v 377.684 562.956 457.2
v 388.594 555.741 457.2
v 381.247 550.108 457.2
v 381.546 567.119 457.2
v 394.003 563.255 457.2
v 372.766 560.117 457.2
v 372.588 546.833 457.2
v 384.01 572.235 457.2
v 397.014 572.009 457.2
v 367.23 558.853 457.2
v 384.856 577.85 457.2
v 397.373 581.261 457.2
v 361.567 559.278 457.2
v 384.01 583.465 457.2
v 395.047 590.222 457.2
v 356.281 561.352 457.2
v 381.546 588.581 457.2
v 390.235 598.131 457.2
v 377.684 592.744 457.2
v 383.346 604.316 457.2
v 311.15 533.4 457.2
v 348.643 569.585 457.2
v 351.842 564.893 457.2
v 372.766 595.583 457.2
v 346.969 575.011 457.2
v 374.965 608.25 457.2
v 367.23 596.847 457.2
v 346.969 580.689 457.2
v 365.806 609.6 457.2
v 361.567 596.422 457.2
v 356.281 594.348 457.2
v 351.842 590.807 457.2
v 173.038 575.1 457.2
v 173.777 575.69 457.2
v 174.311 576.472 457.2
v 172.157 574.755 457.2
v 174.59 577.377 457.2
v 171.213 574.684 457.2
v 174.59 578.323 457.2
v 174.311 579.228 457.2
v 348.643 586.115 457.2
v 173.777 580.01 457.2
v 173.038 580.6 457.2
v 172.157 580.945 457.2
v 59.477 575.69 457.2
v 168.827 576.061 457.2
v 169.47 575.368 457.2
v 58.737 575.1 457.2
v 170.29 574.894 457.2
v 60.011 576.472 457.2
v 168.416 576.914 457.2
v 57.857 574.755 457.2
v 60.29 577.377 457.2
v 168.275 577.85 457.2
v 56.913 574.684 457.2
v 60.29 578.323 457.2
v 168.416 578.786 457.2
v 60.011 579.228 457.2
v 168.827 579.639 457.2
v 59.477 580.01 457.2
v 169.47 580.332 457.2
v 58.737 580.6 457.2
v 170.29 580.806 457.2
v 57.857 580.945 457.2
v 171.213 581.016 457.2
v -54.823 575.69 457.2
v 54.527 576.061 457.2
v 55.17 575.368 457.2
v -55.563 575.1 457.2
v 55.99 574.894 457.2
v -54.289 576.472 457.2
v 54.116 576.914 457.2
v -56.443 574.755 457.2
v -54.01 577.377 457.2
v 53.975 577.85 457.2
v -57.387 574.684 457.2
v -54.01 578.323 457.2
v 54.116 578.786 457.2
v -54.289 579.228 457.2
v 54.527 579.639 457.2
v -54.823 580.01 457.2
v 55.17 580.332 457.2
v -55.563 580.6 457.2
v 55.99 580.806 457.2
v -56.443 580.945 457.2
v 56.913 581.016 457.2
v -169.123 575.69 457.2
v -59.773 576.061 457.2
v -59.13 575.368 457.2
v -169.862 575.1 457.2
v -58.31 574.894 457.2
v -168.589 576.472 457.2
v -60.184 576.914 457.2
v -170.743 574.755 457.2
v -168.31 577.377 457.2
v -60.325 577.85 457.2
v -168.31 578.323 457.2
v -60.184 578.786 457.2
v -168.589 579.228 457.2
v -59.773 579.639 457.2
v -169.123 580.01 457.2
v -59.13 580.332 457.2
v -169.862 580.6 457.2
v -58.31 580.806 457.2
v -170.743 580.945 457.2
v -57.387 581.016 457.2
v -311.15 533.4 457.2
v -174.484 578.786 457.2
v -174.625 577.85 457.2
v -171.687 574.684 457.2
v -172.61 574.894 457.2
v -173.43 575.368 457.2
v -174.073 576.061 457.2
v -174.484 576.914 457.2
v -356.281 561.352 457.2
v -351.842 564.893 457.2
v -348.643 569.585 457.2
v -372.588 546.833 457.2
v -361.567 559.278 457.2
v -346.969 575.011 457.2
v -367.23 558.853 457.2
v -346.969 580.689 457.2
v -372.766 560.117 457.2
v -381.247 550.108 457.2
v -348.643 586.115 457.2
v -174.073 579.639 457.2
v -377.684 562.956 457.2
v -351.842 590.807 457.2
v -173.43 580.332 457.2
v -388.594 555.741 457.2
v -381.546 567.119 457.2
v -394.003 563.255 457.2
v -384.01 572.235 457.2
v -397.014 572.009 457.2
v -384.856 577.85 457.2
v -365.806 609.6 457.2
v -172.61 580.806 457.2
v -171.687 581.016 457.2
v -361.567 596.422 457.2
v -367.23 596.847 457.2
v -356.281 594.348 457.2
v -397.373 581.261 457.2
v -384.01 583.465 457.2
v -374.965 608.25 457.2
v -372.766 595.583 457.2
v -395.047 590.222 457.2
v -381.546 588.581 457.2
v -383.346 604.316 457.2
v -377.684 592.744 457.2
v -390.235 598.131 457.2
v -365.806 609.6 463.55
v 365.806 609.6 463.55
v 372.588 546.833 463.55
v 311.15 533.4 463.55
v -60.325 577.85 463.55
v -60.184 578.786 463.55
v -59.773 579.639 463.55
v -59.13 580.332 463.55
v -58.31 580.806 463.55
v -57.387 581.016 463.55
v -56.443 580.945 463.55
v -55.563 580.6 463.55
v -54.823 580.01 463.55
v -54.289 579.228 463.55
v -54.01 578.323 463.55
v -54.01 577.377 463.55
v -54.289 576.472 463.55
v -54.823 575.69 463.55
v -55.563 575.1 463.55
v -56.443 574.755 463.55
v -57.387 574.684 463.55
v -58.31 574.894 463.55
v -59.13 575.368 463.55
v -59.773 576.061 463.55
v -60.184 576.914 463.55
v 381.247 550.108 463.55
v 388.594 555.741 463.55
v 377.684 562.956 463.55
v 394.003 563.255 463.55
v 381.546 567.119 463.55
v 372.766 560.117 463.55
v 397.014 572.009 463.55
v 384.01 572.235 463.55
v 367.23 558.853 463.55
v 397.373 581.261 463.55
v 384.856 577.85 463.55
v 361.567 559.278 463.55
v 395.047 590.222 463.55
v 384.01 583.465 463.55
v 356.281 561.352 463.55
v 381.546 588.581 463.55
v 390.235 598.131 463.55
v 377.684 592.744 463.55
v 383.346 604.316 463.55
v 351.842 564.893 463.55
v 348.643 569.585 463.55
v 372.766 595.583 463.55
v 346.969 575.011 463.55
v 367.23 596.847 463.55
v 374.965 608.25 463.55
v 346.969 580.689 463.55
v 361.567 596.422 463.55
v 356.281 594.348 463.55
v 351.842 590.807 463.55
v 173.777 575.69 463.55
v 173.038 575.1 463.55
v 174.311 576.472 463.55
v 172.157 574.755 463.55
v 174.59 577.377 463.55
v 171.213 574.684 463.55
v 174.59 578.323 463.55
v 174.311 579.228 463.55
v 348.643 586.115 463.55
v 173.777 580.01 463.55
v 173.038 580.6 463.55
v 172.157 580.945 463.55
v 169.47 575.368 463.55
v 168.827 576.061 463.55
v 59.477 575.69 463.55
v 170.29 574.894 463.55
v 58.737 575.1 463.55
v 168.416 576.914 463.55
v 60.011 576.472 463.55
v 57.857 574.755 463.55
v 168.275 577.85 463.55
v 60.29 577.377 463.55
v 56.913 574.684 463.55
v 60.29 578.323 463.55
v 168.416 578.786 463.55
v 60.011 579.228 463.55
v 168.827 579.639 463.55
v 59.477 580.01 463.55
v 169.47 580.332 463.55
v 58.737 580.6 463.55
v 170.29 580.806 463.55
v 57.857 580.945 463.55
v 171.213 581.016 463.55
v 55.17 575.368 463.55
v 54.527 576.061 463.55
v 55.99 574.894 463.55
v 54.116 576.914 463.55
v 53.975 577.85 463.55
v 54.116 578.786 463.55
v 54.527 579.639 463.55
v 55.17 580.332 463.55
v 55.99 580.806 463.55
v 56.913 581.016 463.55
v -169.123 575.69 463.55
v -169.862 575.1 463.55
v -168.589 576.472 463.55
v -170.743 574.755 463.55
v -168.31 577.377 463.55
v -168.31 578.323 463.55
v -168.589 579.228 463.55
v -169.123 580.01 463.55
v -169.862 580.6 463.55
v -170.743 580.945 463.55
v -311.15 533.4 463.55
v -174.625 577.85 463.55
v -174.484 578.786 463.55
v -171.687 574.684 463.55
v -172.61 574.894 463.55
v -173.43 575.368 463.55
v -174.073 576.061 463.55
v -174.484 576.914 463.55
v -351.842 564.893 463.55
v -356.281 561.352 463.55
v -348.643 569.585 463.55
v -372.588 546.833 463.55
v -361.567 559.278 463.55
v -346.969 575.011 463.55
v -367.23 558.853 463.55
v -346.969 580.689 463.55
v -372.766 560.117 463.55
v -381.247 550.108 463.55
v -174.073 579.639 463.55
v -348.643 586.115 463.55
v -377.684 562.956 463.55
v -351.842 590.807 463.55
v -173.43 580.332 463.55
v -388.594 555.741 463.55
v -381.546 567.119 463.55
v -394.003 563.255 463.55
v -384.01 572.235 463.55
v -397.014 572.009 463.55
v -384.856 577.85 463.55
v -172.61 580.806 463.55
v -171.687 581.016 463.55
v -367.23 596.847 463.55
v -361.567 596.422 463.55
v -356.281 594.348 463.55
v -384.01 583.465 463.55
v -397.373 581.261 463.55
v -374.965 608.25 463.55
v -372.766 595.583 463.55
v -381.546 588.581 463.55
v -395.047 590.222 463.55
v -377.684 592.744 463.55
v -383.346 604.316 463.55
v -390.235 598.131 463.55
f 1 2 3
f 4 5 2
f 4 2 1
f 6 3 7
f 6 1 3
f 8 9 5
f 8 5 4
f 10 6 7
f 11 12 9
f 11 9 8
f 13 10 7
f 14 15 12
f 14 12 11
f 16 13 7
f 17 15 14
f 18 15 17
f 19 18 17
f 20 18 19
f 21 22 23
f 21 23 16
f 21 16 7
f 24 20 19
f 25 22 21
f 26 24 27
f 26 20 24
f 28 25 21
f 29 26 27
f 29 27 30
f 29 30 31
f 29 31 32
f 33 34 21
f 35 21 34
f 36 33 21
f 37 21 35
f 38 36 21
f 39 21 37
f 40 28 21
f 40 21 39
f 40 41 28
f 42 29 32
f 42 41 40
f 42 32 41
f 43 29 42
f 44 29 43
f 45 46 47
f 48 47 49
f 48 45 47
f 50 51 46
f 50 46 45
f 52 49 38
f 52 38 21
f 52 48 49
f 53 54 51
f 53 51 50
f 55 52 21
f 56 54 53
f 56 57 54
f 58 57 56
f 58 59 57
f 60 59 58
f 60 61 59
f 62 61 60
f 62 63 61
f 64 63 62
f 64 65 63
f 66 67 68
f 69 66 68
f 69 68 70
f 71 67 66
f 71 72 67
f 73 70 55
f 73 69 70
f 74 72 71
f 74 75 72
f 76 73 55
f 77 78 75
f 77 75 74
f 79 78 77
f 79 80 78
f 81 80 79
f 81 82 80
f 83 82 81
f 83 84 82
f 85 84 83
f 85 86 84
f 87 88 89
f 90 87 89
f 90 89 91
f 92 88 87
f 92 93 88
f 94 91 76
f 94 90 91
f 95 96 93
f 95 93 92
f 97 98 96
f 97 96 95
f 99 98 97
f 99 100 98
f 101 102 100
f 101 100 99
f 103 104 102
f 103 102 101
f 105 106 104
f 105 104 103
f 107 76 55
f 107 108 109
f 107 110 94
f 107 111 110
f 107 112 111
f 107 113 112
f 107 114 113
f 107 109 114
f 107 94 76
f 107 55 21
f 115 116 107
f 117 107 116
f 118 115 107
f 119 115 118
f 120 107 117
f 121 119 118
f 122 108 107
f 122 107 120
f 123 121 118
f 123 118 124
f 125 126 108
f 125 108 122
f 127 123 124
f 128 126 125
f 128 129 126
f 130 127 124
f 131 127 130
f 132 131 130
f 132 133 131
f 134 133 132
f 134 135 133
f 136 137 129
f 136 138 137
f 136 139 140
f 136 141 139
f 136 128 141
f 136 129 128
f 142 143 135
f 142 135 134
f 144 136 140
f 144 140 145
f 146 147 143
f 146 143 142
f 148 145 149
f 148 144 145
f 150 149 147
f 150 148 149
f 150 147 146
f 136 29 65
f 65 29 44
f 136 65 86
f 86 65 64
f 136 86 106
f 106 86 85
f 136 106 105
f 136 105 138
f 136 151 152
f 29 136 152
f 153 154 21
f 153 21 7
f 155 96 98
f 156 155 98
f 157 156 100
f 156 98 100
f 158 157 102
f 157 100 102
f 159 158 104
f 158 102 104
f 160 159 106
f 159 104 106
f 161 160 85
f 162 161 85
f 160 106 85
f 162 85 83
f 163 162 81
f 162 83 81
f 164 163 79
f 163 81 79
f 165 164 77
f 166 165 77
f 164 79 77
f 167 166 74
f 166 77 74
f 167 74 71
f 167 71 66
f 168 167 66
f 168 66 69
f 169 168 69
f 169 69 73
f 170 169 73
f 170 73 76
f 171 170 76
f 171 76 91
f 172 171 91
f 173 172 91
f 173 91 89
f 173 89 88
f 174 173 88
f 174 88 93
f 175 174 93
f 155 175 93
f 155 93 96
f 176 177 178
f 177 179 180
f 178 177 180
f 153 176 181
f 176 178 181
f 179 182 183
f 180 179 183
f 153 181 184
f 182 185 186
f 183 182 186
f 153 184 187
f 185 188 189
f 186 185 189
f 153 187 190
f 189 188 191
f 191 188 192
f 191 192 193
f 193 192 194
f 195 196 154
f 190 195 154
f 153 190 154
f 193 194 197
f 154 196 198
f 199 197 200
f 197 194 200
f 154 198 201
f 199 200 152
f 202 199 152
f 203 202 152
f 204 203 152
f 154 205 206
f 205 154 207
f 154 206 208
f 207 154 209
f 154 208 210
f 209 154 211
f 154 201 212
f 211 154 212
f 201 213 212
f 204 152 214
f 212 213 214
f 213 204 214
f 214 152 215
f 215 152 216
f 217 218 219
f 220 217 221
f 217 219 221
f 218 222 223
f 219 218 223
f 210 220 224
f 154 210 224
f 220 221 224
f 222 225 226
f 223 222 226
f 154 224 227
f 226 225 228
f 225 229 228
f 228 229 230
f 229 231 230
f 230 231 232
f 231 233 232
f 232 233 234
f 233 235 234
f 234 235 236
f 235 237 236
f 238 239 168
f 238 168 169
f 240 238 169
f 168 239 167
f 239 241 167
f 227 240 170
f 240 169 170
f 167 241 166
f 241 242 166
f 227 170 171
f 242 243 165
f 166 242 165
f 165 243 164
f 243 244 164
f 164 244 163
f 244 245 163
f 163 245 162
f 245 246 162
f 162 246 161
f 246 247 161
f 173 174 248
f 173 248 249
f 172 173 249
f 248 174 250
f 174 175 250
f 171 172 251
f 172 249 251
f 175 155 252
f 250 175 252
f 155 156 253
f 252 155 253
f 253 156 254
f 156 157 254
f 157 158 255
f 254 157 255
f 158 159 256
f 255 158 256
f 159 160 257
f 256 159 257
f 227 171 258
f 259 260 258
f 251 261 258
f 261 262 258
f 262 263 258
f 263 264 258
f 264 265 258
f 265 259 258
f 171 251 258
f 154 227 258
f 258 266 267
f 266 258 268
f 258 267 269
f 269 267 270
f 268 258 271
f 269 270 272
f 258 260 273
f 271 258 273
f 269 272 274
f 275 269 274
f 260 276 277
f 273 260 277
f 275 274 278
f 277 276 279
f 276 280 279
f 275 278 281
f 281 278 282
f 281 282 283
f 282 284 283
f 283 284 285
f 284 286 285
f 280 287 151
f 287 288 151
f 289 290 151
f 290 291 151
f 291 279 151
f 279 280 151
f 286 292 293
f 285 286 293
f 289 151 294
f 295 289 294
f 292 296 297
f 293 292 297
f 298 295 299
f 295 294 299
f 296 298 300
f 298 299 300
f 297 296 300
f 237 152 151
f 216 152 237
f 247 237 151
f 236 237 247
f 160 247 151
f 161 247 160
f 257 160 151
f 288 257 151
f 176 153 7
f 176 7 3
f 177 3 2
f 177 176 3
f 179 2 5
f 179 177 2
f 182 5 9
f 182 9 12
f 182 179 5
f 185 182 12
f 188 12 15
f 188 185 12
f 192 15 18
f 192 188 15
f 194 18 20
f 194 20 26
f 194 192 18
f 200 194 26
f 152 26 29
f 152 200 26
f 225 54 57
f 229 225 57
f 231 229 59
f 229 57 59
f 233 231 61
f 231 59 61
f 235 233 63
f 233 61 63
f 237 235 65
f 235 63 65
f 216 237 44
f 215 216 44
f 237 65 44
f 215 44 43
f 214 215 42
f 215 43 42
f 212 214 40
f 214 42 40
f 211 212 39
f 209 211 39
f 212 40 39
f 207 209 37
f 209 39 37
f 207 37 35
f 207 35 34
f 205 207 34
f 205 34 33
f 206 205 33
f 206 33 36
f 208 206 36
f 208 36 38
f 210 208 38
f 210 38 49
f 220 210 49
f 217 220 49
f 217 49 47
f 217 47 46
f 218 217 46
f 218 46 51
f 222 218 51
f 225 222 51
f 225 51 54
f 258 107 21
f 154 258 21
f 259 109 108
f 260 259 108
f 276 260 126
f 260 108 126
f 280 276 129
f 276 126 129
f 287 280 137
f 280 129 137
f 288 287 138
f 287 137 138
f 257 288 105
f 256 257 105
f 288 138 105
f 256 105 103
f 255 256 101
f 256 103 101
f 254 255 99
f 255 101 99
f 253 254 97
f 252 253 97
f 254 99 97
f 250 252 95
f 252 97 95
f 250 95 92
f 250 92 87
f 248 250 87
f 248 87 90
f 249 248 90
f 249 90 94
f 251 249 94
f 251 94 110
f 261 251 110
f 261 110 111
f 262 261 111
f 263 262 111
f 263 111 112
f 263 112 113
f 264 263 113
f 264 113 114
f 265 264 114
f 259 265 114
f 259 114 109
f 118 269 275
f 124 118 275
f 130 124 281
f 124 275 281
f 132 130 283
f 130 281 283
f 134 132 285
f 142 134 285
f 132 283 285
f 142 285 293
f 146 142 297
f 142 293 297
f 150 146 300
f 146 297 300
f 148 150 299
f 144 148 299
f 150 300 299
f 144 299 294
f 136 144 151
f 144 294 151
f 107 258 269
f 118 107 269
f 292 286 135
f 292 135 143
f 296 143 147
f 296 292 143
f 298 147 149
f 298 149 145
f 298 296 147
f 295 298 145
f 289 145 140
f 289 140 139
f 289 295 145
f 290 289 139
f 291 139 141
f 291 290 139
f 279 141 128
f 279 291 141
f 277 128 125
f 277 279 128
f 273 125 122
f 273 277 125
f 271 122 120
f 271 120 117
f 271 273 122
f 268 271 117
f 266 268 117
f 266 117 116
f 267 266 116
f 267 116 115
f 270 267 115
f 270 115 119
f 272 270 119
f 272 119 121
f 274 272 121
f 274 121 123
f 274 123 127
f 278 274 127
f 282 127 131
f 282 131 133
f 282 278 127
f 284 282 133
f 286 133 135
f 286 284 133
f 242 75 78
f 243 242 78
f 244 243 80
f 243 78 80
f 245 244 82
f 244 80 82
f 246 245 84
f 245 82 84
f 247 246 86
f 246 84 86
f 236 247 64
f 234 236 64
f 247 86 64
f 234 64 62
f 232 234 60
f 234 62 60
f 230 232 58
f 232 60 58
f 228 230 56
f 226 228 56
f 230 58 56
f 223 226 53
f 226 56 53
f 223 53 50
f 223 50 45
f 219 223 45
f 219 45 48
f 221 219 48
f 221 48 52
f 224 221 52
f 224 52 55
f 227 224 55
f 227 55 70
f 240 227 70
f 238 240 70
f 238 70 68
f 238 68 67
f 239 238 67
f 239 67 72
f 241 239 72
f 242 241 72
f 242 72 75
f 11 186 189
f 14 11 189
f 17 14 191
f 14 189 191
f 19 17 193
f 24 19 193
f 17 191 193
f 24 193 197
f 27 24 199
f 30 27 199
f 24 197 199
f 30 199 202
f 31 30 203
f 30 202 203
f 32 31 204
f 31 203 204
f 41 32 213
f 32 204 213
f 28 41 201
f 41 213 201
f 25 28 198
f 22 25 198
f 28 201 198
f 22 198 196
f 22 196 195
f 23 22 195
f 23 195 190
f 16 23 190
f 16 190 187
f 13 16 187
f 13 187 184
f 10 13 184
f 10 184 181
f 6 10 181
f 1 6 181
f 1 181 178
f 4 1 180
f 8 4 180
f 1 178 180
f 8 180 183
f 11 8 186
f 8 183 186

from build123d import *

# Parameters (mm, degrees)
SKETCH1_W                   = 622.3
SKETCH1_H                   = 76.2
BOSS_EXTRUDE1_DEPTH         = 6.35
F_1_4_0_25_DIAMETER_HOLE1_D = 6.35
LPATTERN1_COUNT             = 4
LPATTERN1_PITCH             = 114.3
SKETCH4_R                   = 19.05
BOSS_EXTRUDE3_DEPTH         = 6.35


with BuildPart() as part:
    # Sketch1 → Boss-Extrude1 (new body)
    with BuildSketch(Plane.XY.offset(457.2)):
        with Locations((0, 571.5)):
            Rectangle(SKETCH1_W, SKETCH1_H)
    extrude(amount=BOSS_EXTRUDE1_DEPTH)

    # 1/4 (0.25) Diameter Hole1 (through all)
    with Locations(Plane.XY.offset(463.55)):
        with Locations((171.45, 577.85)):
            f_1_4_0_25_diameter_hole1 = Hole(F_1_4_0_25_DIAMETER_HOLE1_D / 2)

    # LPattern1: 1/4 (0.25) Diameter Hole1 ×4
    with Locations(*[(-i * LPATTERN1_PITCH, 0, 0) for i in range(1, LPATTERN1_COUNT)]):
        add(f_1_4_0_25_diameter_hole1, mode=Mode.SUBTRACT)

    # Sketch4 → Boss-Extrude3 (add)
    with BuildSketch(Plane.XY.offset(463.55)):
        with BuildLine():
            Line((311.15, 533.4), (372.587826171, 546.832705994))
            ThreePointArc((372.587826171, 546.832705994), (397.37252749, 581.26052894), (365.806235462, 609.6))
            Line((365.806235462, 609.6), (311.15, 609.6))
            Line((311.15, 609.6), (311.15, 533.4))
        make_face()
        with Locations((365.806235462, 577.85)):
            Circle(SKETCH4_R, mode=Mode.SUBTRACT)
    boss_extrude3 = extrude(amount=-BOSS_EXTRUDE3_DEPTH)

    # Mirror1: Boss-Extrude3 across plane
    add(boss_extrude3.mirror(Plane(origin=(0, 0, 0), x_dir=(0, 0, 1), z_dir=(1, 0, 0))))


solid = part.part
